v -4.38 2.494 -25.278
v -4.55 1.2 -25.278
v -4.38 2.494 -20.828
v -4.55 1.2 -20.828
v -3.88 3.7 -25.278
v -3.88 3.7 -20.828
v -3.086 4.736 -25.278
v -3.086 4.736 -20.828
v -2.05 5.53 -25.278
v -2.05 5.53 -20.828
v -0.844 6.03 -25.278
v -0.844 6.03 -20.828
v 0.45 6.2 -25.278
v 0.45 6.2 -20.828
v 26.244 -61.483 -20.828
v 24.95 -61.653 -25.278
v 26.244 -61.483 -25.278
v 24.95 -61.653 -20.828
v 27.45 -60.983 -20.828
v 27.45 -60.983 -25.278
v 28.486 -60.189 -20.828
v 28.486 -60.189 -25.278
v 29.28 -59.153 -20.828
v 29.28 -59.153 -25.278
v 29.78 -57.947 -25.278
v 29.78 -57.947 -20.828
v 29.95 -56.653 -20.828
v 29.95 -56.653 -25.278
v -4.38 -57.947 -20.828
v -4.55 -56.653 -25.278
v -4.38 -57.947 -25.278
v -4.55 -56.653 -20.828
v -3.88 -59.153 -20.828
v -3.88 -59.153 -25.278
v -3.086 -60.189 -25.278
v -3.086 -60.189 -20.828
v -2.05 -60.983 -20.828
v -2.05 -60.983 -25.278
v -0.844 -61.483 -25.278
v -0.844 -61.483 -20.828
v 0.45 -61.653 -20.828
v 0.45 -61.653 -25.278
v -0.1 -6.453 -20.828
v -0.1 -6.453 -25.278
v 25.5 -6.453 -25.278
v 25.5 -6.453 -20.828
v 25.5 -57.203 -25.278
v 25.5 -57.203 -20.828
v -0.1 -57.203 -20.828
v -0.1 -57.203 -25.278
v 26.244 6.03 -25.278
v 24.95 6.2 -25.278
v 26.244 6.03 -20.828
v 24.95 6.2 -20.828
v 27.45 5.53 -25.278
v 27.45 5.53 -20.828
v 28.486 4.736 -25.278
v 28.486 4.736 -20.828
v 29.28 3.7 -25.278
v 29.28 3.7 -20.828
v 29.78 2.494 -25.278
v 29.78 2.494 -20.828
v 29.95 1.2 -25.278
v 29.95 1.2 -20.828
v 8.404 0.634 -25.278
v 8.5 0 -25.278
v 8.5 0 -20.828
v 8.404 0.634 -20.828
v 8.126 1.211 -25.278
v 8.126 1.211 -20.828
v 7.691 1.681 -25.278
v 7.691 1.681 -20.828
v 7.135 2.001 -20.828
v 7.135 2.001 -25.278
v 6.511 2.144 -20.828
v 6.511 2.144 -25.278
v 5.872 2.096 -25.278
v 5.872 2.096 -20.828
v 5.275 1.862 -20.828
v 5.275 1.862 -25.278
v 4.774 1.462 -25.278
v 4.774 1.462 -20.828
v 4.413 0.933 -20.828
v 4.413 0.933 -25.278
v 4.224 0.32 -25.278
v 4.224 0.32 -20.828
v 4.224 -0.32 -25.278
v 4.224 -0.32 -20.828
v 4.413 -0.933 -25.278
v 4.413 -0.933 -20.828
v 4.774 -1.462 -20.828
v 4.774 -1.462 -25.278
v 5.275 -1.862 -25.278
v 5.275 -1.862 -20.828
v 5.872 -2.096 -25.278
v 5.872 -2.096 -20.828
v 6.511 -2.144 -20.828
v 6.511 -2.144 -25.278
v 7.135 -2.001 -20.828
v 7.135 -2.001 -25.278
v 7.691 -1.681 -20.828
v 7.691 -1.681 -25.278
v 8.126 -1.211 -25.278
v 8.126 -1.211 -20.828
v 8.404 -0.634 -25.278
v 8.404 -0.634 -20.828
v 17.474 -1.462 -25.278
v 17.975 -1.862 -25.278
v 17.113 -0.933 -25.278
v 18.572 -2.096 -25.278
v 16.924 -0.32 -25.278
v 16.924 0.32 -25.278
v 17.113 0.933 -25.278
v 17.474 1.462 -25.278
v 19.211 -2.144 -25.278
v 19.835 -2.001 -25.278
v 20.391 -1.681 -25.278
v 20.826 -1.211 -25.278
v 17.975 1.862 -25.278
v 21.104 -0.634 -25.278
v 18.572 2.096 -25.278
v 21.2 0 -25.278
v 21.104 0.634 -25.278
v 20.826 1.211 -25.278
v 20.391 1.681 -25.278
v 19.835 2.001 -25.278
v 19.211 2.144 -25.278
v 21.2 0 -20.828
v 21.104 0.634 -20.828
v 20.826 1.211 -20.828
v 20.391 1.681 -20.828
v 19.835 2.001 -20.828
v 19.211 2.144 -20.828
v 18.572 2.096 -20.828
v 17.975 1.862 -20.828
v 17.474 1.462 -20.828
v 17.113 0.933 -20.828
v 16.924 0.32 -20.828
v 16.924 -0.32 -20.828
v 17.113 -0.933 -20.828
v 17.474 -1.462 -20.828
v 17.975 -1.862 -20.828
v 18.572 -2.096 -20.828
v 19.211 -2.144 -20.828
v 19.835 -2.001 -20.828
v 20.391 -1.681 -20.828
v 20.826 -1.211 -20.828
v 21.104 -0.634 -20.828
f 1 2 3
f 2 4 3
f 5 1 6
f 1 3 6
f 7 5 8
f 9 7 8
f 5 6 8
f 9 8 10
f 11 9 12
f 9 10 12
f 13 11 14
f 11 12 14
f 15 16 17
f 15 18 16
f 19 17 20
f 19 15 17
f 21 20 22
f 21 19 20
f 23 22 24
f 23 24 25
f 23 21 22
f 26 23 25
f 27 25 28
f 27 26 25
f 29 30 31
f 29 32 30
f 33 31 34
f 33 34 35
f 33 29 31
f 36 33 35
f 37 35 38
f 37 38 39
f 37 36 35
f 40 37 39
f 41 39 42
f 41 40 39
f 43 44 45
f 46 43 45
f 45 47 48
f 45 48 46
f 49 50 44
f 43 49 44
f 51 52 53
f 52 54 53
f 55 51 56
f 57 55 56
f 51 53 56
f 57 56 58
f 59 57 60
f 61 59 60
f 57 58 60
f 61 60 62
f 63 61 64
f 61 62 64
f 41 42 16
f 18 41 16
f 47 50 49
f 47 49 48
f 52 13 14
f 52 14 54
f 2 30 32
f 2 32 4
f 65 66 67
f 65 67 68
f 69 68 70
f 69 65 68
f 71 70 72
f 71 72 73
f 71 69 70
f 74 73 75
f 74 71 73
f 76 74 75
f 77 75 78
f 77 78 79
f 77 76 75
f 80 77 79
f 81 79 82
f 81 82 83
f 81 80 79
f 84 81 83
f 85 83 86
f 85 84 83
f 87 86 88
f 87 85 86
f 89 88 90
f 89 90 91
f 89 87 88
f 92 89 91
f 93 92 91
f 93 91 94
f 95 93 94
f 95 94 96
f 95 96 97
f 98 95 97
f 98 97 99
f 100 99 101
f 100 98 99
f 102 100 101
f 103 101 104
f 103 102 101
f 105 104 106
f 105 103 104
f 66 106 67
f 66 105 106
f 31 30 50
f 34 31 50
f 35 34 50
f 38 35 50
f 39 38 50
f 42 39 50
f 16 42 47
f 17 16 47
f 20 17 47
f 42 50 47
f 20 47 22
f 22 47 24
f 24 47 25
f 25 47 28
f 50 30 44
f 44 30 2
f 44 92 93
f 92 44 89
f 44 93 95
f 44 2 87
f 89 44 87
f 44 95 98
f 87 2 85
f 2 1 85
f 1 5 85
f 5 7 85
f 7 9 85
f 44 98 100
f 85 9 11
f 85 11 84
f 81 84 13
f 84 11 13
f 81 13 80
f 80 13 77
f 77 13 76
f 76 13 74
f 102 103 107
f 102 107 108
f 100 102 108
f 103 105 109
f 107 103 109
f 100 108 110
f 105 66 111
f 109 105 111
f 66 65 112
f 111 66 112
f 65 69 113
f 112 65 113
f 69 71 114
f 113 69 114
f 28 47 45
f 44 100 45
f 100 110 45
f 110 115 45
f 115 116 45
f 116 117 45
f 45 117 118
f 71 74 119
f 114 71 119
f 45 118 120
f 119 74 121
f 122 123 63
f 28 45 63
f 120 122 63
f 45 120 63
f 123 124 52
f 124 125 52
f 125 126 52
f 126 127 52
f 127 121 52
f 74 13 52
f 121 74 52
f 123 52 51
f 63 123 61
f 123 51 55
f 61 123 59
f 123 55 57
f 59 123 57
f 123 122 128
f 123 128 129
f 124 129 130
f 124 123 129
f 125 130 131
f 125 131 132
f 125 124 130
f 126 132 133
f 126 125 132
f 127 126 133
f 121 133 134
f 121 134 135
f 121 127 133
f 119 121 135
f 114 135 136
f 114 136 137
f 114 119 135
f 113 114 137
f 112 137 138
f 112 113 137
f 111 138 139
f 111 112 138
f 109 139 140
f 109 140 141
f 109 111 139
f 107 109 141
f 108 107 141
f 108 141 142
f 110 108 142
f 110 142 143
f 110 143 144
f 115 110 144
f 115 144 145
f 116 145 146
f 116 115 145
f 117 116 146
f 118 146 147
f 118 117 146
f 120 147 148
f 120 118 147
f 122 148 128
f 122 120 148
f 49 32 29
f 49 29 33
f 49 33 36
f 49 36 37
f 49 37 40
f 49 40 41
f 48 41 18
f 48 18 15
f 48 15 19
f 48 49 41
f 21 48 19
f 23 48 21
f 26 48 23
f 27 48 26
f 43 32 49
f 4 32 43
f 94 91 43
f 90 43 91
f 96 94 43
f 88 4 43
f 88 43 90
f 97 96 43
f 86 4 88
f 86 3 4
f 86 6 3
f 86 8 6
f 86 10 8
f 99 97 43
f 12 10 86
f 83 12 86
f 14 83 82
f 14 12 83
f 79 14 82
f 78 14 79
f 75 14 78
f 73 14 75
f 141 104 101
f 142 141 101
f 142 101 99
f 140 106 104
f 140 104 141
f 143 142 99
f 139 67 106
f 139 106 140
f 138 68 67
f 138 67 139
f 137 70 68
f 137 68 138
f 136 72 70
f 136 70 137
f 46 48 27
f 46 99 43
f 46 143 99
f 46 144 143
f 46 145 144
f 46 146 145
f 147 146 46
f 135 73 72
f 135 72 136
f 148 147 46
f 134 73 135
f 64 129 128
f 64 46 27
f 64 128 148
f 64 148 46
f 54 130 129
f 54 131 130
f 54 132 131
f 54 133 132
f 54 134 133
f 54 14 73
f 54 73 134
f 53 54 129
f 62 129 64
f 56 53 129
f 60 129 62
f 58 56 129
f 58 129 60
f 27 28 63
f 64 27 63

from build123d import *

# Parameters (mm, degrees)
SKETCH3_W           = 34.5
SKETCH3_H           = 67.853
SKETCH3_R           = 2.15
SKETCH3_W_2         = 25.6
SKETCH3_H_2         = 50.75
BOSS_EXTRUDE1_DEPTH = 4.45
FILLET1_R           = 5


with BuildPart() as part:
    # Sketch3 → Boss-Extrude1 (new body)
    with BuildSketch(Plane.XY.offset(-25.278270569)):
        with Locations((12.7, -27.7265)):
            Rectangle(SKETCH3_W, SKETCH3_H)
        with Locations((6.35, 0)):
            Circle(SKETCH3_R, mode=Mode.SUBTRACT)
        with Locations((19.05, 0)):
            Circle(SKETCH3_R, mode=Mode.SUBTRACT)
        with Locations((12.7, -31.828)):
            Rectangle(SKETCH3_W_2, SKETCH3_H_2, mode=Mode.SUBTRACT)
    extrude(amount=BOSS_EXTRUDE1_DEPTH)

    # Fillet1
    fillet1_edges = [part.edges().sort_by_distance(p)[0] for p in [
        (29.95, -61.653, -23.053270569),
        (-4.55, -61.653, -23.053270569),
        (-4.55, 6.2, -23.053270569),
        (29.95, 6.2, -23.053270569),
    ]]
    fillet(fillet1_edges, radius=FILLET1_R)


solid = part.part
